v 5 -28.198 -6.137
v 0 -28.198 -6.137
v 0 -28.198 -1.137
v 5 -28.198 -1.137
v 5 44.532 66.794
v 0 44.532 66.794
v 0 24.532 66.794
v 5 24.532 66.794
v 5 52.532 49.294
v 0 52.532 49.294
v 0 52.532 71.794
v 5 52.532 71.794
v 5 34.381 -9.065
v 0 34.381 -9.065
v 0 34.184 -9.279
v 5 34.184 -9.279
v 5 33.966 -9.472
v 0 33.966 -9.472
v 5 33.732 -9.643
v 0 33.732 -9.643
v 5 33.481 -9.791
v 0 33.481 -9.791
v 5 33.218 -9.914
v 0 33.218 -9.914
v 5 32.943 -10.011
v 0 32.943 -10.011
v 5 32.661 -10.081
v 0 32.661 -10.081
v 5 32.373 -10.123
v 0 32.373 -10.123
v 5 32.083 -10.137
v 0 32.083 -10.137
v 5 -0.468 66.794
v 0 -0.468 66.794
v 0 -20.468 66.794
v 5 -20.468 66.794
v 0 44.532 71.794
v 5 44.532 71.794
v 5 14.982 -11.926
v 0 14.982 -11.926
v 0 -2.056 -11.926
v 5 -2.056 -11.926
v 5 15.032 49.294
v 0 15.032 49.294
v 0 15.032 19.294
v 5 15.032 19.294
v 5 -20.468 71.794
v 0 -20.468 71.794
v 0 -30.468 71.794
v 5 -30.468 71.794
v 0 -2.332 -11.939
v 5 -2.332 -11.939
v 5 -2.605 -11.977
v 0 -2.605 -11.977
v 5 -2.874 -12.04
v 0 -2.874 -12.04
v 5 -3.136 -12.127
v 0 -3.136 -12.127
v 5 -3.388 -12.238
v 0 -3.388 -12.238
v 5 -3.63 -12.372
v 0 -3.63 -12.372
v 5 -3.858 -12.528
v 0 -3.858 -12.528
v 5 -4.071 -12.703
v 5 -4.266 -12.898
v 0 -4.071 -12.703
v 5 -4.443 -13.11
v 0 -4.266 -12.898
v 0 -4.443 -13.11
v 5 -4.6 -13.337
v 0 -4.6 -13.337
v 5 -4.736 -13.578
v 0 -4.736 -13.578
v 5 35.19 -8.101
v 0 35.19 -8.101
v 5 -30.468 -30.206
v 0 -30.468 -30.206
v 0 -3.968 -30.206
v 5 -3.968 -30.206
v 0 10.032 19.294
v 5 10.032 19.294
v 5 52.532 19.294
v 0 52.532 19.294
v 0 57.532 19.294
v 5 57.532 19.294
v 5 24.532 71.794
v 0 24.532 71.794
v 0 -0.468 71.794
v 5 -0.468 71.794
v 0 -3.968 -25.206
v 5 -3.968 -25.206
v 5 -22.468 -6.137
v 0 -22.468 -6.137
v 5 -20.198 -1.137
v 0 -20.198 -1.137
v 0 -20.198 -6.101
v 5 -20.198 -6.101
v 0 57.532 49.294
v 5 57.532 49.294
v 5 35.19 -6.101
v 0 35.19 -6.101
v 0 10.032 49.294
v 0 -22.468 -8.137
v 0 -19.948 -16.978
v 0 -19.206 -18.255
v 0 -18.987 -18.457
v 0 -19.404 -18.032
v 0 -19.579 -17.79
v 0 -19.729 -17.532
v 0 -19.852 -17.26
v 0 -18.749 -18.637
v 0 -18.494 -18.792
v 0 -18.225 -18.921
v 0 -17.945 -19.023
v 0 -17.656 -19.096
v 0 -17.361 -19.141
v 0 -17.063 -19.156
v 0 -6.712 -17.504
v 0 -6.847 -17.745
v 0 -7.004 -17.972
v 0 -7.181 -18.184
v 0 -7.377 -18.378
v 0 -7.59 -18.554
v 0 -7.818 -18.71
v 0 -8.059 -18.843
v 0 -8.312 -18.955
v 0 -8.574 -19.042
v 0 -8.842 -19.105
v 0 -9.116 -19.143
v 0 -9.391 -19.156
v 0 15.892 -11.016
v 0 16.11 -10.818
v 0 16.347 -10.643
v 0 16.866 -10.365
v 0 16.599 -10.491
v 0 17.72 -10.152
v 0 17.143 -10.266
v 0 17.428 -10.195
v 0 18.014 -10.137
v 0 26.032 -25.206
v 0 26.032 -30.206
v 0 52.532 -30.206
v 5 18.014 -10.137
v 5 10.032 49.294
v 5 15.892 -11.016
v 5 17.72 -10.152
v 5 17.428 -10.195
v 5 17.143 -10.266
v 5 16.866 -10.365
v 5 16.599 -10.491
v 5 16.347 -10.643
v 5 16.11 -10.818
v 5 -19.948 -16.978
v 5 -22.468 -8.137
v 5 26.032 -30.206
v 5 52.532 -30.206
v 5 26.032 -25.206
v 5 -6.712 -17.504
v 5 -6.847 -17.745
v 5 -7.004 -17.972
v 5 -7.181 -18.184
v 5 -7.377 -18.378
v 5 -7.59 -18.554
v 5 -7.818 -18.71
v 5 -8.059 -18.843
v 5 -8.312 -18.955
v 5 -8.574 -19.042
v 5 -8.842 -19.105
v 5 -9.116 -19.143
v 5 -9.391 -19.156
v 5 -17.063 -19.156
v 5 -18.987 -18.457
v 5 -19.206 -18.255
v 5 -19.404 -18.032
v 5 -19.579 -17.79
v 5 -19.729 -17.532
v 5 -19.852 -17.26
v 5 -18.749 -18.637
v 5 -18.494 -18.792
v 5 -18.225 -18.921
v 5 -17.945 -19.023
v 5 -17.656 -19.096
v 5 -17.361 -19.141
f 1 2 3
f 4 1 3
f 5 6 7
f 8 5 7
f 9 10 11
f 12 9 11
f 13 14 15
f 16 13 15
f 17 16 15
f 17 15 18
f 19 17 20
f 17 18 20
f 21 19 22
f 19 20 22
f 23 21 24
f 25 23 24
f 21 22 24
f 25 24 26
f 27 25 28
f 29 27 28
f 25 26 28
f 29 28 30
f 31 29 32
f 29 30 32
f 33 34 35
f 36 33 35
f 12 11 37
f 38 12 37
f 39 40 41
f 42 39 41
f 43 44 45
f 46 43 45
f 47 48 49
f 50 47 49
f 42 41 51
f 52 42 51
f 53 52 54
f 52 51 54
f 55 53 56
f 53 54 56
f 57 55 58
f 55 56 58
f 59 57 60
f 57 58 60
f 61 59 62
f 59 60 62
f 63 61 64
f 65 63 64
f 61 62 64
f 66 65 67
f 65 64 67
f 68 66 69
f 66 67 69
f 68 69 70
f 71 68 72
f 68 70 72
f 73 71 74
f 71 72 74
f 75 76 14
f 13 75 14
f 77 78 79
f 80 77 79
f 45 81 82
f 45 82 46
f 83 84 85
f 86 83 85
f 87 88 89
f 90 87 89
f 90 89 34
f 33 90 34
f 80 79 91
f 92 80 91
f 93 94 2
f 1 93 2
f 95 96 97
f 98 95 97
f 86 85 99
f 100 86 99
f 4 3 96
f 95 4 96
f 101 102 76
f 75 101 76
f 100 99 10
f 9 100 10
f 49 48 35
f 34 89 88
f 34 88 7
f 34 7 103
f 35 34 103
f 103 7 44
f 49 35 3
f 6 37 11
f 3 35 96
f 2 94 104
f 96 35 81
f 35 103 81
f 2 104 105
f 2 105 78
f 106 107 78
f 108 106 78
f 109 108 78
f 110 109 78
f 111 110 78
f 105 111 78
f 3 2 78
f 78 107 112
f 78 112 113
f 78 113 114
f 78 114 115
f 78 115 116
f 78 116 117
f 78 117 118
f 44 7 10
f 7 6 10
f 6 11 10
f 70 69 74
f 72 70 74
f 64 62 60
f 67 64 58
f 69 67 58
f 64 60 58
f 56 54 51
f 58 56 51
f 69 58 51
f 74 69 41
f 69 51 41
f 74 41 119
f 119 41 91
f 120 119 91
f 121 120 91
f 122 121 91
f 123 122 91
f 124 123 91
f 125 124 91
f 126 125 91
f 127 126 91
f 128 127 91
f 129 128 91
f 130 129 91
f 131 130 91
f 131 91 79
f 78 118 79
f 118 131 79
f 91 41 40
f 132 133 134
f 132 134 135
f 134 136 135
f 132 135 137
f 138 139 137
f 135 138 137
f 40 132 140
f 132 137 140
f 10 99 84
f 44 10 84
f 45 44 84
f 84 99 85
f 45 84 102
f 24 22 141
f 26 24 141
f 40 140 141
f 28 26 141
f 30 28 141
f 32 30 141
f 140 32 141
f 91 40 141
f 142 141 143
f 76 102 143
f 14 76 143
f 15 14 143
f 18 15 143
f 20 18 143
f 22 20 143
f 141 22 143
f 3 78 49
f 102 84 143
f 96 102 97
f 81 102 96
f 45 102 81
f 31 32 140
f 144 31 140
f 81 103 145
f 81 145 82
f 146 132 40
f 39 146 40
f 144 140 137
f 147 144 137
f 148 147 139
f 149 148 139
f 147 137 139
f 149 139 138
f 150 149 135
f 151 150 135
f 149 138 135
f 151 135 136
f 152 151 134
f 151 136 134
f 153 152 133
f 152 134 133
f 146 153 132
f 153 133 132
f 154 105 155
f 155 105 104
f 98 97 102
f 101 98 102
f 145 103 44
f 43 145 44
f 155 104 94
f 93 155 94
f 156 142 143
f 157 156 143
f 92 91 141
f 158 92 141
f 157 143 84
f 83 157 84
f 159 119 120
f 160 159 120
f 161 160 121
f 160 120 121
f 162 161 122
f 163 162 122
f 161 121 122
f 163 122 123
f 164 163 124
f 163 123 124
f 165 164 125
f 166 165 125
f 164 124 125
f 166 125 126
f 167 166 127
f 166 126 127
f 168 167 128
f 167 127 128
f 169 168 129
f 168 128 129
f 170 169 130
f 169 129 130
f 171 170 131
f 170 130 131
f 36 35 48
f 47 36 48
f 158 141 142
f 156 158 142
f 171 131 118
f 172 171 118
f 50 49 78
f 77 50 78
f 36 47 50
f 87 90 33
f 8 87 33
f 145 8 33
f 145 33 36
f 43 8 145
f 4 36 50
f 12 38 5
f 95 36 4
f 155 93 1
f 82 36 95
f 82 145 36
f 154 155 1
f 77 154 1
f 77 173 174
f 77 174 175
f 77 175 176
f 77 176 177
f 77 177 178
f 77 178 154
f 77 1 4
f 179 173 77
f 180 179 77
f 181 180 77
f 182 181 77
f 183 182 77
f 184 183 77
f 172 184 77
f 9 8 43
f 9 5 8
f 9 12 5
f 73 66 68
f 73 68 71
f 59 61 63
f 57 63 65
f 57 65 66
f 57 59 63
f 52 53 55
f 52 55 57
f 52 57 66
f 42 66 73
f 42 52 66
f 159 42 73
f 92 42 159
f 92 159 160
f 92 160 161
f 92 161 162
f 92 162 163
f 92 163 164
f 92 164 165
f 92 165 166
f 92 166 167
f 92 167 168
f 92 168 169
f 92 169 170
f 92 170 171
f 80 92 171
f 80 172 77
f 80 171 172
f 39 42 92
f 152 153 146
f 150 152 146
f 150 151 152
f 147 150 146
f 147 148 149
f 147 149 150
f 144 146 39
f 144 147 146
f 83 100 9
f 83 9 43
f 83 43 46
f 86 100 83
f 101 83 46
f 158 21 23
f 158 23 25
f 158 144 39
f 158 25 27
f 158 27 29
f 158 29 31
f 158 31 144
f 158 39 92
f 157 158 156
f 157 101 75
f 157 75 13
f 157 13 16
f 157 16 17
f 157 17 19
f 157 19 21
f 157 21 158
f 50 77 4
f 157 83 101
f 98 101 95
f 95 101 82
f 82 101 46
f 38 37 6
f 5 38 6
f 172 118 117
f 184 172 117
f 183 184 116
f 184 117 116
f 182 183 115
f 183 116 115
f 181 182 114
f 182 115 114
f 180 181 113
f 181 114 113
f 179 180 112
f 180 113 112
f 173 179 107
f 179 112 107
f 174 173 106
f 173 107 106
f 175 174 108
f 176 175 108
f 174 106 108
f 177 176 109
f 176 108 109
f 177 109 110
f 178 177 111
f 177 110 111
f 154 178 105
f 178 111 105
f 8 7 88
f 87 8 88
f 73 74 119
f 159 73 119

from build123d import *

# Parameters (mm, degrees)
SKETCH_1_W      = 30
SKETCH_1_H      = 5
EXTRUDE_1_DEPTH = 5


with BuildPart() as part:
    # 草图1 → 凸台-拉伸1 (new body)
    with BuildSketch(Plane(origin=(0, 0, 0), x_dir=(0, 0, -1), z_dir=(1, 0, 0))):
        Polygon((-71.794387691, -30.467986568), (30.205612309, -30.467986568), (30.205612309, -3.967986568), (25.205612309, -3.967986568), (25.205612309, 26.032013432), (30.205612309, 26.032013432), (30.205612309, 52.532013432), (-19.294387691, 52.532013432), (-19.294387691, 57.532013432), (-49.294387691, 57.532013432), (-49.294387691, 52.532013432), (-71.794387691, 52.532013432), (-71.794387691, 44.532013432), (-66.794387691, 44.532013432), (-66.794387691, 24.532013432), (-71.794387691, 24.532013432), (-71.794387691, -0.467986568), (-66.794387691, -0.467986568), (-66.794387691, -20.467986568), (-71.794387691, -20.467986568), align=None)
        with Locations((-34.294387691, 12.532013432)):
            Rectangle(SKETCH_1_W, SKETCH_1_H, mode=Mode.SUBTRACT)
        with BuildLine():
            Line((6.101172562, -20.197681499), (6.101172562, 35.190002139))
            Line((6.101172562, 35.190002139), (8.101172562, 35.190013424))
            Line((8.101172562, 35.190013424), (9.065260801, 34.381164181))
            ThreePointArc((9.065260801, 34.381164181), (9.8559397, 33.350845179), (10.137061428, 32.082893705))
            Line((10.137061428, 32.082893705), (10.137061428, 18.013655336))
            ThreePointArc((10.137061428, 18.013655336), (10.36542283, 16.865605039), (11.015741084, 15.892334992))
            Line((11.015741084, 15.892334992), (11.926129512, 14.981946565))
            Line((11.926129512, 14.981946565), (11.926129512, -2.055830909))
            ThreePointArc((11.926129512, -2.055830909), (12.372134093, -3.629713816), (13.577534447, -4.735624064))
            Line((13.577534447, -4.735624064), (17.504207374, -6.71170633))
            ThreePointArc((17.504207374, -6.71170633), (18.709607728, -7.817616578), (19.155612309, -9.391499485))
            Line((19.155612309, -9.391499485), (19.155612309, -17.062905379))
            ThreePointArc((19.155612309, -17.062905379), (18.550098161, -18.870234212), (16.977987304, -19.947987591))
            Line((16.977987304, -19.947987591), (8.137246436, -22.467986568))
            Line((8.137246436, -22.467986568), (6.137246436, -22.467986568))
            Line((6.137246436, -22.467986568), (6.137246436, -28.197986568))
            Line((6.137246436, -28.197986568), (1.137246436, -28.197986568))
            Line((1.137246436, -28.197986568), (1.137246436, -20.197681499))
            Line((1.137246436, -20.197681499), (6.101172562, -20.197681499))
        make_face(mode=Mode.SUBTRACT)
    extrude(amount=EXTRUDE_1_DEPTH)


solid = part.part
